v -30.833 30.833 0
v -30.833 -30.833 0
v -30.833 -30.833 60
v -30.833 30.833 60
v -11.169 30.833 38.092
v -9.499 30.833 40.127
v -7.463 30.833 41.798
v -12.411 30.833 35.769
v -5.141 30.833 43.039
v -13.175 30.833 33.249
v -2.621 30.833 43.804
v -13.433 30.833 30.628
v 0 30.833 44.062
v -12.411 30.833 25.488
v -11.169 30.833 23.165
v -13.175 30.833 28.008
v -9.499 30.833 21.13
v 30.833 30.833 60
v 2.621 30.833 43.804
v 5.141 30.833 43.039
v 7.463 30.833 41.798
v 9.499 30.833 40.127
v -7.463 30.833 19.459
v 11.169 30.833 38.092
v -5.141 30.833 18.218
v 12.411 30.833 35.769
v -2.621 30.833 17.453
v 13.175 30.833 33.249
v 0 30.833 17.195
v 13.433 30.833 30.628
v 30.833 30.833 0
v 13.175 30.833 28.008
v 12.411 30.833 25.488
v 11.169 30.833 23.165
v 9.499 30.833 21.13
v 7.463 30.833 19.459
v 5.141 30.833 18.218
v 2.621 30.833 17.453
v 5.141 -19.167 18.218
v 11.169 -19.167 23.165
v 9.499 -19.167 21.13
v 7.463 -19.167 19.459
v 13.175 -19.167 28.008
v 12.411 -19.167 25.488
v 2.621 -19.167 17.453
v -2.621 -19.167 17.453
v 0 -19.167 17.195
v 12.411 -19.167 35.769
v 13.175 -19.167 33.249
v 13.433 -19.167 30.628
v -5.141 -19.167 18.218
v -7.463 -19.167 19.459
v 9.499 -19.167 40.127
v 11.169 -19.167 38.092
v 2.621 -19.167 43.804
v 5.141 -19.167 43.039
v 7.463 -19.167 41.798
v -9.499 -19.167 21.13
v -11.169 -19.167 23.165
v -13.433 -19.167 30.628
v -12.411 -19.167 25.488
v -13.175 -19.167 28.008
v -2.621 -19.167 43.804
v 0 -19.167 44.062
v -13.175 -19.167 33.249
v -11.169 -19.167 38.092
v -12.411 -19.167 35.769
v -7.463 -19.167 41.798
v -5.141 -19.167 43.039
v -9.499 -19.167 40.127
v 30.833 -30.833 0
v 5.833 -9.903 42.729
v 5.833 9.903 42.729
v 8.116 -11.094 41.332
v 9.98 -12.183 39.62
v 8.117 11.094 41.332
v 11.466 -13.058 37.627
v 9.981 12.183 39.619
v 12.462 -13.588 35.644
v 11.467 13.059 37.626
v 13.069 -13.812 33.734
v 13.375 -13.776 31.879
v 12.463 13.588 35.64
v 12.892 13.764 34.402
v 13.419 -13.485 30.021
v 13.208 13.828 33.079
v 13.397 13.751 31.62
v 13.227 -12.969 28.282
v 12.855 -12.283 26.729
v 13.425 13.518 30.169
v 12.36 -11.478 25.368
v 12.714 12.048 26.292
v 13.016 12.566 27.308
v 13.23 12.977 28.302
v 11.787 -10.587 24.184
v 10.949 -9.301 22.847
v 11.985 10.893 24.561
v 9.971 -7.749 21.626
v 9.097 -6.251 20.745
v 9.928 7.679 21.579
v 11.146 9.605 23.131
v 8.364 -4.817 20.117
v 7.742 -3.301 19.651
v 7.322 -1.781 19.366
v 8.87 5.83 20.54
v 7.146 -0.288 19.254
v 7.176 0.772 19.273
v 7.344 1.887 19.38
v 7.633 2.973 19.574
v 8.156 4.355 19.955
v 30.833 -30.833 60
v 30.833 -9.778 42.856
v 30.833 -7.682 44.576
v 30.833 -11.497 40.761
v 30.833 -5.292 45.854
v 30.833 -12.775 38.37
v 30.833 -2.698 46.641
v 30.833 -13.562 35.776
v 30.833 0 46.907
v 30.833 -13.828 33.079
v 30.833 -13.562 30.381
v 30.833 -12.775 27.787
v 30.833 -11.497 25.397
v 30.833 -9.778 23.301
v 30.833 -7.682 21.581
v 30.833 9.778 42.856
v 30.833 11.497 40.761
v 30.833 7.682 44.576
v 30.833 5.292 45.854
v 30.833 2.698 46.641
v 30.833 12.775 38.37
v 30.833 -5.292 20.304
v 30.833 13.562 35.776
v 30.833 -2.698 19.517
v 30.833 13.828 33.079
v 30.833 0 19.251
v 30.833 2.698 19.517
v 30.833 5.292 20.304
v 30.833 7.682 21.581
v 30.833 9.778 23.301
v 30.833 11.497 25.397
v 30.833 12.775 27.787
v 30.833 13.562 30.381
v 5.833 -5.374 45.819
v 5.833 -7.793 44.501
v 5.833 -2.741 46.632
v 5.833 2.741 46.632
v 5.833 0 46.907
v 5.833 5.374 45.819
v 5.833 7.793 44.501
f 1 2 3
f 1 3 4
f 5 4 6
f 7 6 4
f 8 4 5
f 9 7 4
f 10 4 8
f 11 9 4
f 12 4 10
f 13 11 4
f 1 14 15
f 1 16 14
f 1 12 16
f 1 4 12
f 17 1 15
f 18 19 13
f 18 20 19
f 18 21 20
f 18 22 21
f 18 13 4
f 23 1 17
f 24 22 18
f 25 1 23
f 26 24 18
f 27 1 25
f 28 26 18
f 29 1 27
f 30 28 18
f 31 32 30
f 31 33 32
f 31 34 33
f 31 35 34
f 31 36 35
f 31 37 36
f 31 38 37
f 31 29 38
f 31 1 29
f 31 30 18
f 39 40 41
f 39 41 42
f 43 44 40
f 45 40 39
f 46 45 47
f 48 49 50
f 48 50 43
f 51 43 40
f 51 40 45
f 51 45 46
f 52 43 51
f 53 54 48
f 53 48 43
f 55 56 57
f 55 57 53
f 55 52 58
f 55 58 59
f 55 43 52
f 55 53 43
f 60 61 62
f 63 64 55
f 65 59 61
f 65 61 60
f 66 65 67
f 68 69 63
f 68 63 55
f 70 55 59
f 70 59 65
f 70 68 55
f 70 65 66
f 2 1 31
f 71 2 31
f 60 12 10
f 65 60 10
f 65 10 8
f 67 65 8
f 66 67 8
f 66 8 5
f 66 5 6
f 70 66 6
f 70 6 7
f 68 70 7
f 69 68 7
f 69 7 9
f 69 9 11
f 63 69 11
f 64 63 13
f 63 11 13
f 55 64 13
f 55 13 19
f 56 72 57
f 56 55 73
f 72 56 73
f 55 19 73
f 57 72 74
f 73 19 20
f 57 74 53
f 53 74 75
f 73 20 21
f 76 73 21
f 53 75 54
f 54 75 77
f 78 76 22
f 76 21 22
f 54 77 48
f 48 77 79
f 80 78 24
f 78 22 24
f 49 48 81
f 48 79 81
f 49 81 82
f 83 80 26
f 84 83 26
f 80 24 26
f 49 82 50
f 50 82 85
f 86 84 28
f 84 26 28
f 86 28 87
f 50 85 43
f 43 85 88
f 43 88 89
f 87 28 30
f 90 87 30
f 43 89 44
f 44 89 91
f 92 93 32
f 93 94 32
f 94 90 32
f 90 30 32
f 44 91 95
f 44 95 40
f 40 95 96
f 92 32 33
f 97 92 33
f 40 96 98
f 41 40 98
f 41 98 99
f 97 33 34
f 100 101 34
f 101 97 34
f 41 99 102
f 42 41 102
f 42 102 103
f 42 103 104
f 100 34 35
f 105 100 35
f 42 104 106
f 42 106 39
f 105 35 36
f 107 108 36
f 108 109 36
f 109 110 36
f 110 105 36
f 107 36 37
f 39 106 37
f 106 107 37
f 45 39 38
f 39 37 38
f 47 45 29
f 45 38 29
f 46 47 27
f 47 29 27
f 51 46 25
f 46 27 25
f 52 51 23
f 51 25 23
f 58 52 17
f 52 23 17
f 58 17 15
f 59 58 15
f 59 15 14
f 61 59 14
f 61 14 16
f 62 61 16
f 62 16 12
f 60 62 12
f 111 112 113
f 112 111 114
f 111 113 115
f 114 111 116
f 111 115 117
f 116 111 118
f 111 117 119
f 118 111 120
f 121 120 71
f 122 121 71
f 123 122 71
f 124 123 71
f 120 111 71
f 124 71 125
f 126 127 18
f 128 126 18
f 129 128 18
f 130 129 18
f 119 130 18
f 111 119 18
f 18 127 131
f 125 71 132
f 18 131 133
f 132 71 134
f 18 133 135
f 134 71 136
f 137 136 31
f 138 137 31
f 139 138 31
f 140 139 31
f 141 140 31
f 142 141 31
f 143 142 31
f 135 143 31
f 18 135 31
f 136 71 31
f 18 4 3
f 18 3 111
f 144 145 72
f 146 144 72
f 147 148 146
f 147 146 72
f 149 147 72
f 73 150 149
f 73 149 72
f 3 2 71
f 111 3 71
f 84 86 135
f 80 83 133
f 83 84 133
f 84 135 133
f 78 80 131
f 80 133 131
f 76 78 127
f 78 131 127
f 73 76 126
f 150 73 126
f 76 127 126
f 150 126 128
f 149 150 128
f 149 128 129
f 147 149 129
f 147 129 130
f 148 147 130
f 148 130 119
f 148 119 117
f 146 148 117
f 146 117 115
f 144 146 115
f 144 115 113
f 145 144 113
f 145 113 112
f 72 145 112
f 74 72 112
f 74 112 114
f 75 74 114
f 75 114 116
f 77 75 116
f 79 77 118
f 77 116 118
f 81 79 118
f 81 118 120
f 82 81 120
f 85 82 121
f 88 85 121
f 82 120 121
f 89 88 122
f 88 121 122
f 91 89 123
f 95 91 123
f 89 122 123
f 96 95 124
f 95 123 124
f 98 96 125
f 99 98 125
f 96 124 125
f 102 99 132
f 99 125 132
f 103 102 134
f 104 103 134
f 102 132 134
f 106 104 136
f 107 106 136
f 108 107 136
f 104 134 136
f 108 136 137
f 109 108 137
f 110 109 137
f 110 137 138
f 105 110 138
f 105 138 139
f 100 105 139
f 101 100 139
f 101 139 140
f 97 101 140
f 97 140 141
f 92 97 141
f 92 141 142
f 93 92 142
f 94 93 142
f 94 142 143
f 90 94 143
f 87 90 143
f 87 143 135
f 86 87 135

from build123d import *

# Parameters (mm, degrees)
F0_W     = 61.665386
F0_H     = 61.6654
F1_DEPTH = 60
F2_R     = 13.827744
F3_DEPTH = 25
F4_R     = 16.83794
F5_DEPTH = 50
F6_R     = 13.433153
F7_DEPTH = 50


with BuildPart() as f1:
    # F0 (on Top) → F1 (new body)
    with BuildSketch(Plane.XY):
        Rectangle(F0_W, F0_H)
    extrude(amount=F1_DEPTH)

    # F2 (on face) → F3 (cut)
    with BuildSketch(Plane.YZ.offset(30.832693)):
        with Locations((0, 33.078797)):
            Circle(F2_R)
    extrude(amount=-F3_DEPTH, mode=Mode.SUBTRACT)

    # F4 (on face) → F5 (cut)
    with BuildSketch(Plane(origin=(0, 30.8327, 0), x_dir=(-1, 0, 0), z_dir=(0, 1, 0))):
        with Locations((0, 30.424289)):
            Circle(F4_R)
    extrude(amount=F5_DEPTH, mode=Mode.SUBTRACT)

    # F6 (on face) → F7 (cut)
    with BuildSketch(Plane(origin=(0, 30.8327, 0), x_dir=(-1, 0, 0), z_dir=(0, 1, 0))):
        with Locations((0, 30.62848)):
            Circle(F6_R)
    extrude(amount=-F7_DEPTH, mode=Mode.SUBTRACT)


solid = f1.part
